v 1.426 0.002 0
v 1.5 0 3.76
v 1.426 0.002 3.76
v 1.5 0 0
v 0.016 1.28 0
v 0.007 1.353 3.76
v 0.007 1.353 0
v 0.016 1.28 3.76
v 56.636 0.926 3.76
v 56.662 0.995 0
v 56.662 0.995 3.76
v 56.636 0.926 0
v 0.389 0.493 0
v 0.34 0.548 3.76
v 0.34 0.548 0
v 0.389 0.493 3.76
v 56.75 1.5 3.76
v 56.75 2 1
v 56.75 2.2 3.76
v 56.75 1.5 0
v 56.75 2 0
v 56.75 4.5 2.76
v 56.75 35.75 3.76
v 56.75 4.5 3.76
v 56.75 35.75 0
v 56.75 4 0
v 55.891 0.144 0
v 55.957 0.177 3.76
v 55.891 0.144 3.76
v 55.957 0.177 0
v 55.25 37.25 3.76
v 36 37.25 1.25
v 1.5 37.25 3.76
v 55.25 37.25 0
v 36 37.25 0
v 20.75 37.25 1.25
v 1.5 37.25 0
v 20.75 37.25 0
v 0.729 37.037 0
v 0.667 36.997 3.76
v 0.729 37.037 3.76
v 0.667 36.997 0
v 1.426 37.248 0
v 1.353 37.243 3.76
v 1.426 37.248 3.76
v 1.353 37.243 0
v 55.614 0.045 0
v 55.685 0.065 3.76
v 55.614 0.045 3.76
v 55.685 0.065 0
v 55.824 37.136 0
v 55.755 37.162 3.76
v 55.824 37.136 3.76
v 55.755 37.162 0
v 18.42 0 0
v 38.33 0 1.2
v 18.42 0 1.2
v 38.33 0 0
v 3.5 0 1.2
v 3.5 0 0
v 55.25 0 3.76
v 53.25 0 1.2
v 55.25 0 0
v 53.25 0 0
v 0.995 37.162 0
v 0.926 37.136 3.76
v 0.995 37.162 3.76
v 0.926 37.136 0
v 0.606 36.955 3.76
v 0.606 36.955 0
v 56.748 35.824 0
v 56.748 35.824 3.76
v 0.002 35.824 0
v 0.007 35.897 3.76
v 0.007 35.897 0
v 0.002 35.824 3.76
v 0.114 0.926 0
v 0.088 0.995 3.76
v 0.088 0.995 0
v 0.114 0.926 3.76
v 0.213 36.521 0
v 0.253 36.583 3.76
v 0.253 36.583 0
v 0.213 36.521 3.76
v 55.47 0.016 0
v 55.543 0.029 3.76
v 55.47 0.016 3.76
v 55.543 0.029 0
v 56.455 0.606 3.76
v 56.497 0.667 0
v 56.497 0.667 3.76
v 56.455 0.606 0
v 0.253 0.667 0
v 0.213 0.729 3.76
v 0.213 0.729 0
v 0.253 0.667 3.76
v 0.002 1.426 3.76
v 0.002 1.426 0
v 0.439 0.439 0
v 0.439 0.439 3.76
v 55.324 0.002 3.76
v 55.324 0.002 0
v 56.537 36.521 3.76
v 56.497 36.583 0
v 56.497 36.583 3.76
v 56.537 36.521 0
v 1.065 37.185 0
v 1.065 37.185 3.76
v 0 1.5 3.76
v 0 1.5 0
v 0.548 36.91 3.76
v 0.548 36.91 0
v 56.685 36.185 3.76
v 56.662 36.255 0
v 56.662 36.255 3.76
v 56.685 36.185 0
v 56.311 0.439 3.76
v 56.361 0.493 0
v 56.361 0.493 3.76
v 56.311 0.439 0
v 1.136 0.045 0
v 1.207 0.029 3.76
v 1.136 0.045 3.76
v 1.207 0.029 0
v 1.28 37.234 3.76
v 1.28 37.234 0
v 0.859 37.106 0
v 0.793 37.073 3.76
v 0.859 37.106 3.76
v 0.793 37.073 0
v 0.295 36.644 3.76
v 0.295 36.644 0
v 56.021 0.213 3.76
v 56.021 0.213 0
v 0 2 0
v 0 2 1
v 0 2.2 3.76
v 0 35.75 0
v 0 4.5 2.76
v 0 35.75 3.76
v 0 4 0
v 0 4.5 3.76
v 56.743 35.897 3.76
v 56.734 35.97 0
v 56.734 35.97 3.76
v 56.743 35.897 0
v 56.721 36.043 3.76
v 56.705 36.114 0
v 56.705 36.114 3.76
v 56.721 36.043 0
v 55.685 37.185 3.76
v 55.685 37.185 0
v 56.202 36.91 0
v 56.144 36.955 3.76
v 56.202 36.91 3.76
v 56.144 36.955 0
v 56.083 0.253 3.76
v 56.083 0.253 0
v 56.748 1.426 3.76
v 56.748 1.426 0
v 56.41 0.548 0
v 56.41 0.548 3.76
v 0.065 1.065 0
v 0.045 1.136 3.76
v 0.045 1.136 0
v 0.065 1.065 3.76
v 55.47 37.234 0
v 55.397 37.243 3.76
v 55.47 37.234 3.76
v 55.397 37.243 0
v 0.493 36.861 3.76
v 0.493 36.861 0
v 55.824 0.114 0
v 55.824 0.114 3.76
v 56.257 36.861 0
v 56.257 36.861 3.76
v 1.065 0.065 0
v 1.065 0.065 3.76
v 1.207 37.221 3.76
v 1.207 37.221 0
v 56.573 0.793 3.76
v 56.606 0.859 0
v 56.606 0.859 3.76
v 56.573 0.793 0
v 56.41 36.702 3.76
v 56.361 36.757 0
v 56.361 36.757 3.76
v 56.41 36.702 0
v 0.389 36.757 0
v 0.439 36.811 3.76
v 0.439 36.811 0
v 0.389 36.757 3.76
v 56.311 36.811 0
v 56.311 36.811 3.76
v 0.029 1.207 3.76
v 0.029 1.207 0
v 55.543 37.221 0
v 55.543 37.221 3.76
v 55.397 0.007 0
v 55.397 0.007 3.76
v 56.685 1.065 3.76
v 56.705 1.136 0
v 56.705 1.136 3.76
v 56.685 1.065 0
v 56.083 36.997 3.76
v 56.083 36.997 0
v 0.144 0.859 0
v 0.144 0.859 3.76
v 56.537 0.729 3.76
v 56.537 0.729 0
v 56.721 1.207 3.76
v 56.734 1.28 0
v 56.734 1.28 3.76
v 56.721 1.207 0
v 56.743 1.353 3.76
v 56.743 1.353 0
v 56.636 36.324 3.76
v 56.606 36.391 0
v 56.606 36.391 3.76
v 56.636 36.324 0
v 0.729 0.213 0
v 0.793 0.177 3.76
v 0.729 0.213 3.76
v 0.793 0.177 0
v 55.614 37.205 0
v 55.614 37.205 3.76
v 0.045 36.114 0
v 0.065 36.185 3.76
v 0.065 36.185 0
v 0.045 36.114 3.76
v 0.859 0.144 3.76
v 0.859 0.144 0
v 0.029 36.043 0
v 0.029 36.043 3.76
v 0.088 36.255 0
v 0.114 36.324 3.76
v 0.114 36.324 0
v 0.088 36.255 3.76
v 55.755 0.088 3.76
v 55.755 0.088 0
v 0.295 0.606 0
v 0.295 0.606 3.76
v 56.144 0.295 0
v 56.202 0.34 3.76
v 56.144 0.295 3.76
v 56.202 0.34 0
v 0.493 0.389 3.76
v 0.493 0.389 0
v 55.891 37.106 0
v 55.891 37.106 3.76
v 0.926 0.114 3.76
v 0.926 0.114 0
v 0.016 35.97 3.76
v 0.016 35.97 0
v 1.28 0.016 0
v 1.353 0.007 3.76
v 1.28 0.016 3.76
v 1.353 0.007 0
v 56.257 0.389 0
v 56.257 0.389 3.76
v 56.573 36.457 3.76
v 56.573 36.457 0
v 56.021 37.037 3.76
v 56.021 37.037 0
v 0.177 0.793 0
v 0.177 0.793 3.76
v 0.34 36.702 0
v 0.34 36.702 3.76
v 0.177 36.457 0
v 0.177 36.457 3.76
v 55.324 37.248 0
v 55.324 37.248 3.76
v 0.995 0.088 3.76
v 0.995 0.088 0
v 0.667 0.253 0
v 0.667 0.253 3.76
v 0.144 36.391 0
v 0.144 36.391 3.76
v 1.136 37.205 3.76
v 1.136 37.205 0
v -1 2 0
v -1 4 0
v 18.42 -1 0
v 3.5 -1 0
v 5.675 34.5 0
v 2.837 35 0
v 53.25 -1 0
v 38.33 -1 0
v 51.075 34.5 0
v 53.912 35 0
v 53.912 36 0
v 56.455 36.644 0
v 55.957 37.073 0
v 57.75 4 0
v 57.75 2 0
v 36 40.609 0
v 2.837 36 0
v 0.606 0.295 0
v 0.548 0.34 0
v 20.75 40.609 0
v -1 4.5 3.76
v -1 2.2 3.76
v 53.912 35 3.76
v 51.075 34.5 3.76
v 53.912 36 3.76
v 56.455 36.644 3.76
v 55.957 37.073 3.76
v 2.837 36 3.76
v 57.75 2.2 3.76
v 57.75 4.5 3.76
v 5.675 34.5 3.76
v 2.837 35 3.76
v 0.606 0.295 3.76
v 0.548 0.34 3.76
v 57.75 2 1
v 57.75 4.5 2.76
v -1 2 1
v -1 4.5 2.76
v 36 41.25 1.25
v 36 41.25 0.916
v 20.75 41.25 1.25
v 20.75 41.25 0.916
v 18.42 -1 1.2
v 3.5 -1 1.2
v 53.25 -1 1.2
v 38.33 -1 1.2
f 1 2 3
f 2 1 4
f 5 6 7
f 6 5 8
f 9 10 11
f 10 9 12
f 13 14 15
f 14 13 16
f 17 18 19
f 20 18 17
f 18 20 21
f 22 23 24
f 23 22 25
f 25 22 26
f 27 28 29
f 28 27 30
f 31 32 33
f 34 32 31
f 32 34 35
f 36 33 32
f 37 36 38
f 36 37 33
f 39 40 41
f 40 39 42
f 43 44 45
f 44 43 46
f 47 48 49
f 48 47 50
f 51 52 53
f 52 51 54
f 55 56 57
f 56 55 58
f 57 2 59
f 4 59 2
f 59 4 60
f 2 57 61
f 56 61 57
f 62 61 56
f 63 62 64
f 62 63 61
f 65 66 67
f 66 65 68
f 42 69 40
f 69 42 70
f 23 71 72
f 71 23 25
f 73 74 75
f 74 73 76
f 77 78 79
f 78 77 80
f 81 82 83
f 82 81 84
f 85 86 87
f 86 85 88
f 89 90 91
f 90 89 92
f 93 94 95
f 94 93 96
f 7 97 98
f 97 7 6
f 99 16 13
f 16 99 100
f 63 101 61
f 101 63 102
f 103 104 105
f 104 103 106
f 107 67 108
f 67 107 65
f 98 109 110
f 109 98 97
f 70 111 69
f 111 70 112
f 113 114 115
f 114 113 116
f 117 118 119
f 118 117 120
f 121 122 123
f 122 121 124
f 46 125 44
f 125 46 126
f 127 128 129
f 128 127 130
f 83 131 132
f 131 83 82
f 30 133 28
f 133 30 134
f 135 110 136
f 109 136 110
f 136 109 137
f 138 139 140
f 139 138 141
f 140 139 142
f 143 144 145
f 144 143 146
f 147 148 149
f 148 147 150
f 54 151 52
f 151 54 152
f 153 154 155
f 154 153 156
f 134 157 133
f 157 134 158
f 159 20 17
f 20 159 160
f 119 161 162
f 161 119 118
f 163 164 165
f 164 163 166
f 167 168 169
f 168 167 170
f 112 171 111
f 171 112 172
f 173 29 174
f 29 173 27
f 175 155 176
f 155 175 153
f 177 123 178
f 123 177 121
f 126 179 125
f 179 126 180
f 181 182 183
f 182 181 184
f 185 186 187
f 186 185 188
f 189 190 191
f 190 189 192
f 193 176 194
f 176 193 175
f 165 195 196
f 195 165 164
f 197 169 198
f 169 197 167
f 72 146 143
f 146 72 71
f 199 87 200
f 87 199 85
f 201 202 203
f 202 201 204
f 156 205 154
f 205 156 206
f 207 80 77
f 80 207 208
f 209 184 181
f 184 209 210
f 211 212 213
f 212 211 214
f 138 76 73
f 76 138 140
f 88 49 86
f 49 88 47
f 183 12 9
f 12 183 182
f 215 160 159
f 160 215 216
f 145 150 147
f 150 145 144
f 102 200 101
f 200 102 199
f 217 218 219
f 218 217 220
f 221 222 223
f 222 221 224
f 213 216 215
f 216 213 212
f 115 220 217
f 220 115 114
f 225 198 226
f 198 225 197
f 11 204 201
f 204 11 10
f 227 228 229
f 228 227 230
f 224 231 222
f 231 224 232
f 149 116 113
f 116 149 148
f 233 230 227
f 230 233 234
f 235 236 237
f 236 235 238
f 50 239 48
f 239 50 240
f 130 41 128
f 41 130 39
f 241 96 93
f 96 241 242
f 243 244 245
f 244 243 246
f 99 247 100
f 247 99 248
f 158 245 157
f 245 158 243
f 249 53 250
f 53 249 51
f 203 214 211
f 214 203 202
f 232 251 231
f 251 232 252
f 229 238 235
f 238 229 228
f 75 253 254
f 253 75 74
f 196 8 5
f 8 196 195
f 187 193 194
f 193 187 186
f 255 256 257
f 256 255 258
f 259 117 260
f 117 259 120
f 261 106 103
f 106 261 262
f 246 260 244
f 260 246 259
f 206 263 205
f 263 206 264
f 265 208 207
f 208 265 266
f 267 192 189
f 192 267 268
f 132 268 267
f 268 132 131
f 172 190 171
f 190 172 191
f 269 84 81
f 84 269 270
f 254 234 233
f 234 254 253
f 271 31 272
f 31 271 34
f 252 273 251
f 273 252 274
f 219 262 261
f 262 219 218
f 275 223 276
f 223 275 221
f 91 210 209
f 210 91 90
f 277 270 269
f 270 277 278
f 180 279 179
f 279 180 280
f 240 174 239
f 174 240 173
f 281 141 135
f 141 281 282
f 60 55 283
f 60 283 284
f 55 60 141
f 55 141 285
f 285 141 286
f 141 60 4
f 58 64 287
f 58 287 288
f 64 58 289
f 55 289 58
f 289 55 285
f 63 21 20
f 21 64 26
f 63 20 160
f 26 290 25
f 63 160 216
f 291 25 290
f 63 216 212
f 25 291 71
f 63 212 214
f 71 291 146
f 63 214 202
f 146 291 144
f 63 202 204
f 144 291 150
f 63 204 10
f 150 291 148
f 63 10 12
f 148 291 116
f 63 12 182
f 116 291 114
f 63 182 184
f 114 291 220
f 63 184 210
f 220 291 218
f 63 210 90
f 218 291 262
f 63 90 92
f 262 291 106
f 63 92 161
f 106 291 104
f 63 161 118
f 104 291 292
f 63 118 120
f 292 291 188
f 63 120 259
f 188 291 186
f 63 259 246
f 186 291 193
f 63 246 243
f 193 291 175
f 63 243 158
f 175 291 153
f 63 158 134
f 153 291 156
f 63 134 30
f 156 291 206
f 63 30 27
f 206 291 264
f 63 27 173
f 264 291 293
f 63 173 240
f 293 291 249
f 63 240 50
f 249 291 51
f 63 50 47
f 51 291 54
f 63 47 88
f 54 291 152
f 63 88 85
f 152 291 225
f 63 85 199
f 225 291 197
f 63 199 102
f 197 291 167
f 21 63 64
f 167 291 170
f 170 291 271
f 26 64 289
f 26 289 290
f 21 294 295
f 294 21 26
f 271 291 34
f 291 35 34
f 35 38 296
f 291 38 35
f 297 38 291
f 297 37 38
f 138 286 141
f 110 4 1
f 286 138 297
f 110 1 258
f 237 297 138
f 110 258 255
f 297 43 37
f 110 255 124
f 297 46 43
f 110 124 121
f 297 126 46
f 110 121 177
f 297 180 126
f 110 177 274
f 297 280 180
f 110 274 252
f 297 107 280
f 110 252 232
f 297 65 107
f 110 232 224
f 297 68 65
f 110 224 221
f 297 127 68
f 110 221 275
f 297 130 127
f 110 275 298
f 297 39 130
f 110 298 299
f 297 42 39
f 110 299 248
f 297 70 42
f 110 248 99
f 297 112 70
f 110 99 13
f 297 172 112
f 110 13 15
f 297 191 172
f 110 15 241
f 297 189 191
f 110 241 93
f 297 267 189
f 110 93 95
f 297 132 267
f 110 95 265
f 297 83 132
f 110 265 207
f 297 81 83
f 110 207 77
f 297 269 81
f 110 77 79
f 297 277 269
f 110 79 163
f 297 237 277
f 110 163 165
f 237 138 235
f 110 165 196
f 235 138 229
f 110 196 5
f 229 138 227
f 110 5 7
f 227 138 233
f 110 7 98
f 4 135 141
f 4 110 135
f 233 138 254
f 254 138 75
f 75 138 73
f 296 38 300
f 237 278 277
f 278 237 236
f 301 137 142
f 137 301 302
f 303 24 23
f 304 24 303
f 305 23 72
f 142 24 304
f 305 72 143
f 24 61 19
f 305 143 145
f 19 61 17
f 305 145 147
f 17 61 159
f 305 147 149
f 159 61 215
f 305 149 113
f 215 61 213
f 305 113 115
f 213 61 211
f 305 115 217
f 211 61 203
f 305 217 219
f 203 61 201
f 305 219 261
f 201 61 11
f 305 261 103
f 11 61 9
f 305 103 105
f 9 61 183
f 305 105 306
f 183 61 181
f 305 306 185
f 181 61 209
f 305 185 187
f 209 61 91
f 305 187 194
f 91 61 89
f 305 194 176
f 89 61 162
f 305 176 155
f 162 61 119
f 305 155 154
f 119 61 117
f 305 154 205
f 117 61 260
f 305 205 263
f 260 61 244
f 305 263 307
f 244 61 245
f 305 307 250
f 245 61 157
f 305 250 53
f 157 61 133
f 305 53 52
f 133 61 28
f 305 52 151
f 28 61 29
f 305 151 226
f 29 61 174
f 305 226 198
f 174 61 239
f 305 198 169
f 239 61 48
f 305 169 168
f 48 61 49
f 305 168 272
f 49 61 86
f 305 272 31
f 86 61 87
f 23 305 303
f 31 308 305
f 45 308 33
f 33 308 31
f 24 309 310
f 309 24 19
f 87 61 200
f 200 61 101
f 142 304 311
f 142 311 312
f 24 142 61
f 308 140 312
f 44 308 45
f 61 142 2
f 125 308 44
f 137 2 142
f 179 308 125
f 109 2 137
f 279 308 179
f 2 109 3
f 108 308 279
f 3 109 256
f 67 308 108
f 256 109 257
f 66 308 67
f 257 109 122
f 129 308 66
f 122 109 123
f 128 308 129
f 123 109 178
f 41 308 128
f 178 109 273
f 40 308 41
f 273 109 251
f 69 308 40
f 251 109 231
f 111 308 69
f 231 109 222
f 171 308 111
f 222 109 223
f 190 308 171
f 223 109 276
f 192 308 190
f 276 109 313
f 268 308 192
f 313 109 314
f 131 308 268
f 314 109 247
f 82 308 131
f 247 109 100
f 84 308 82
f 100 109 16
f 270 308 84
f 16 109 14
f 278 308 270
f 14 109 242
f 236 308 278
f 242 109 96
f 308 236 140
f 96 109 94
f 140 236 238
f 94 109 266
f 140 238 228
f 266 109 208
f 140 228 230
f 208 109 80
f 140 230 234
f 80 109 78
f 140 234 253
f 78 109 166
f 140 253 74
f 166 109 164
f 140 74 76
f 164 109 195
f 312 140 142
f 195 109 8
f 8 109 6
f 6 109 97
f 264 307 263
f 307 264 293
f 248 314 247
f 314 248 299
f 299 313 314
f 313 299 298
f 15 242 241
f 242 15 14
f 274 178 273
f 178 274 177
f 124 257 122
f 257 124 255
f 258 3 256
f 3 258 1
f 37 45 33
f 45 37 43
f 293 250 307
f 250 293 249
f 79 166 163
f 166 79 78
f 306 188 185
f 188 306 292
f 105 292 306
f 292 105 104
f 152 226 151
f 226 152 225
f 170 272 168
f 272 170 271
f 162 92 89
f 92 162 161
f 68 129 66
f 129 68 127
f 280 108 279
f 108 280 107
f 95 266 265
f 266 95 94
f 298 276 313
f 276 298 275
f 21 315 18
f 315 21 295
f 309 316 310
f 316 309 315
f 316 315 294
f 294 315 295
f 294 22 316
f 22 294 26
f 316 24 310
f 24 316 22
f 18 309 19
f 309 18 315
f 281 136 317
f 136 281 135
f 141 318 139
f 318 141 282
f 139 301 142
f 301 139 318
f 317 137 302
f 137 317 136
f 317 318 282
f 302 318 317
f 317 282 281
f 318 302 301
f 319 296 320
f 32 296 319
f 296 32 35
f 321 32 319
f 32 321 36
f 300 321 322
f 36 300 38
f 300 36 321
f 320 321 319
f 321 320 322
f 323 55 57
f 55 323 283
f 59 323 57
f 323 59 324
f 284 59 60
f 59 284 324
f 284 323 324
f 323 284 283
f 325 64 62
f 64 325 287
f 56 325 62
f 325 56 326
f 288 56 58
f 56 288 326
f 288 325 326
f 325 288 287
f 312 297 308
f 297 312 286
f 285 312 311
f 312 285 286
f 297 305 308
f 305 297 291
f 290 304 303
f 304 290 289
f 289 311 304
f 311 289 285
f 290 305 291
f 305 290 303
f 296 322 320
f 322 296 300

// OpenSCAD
module plug() {
    $fn=128;
    H=4-0.24;
    
    union() {
    // Main body
    hull() {
        translate([1,1,0]*3/2)
        cylinder(h=H, d=3);
        
        translate([56.75-3,0,0])
        translate([1,1,0]*3/2)
        cylinder(h=H, d=3);
        
        translate([56.75-3,37.25-3,0])
        translate([1,1,0]*3/2)
        cylinder(h=H, d=3);
        
        translate([0,37.25-3,0])
        translate([1,1,0]*3/2)
        cylinder(h=H, d=3);
    }

    // Side pegs
    translate([56.75,2,0])
    hull() {
        cube([1,2,1]);
        
        translate([0,.2,3-.24])
        cube([1,2.5-.2,1]);
    }
    
    translate([-1,2,0])
    hull() {
        cube([1,2,1]);
        
        translate([0,.2,3-.24])
        cube([1,2.5-.2,1]);
    }
    
    // Top peg
    translate([56.75/2,37.25+2,1.25/2])
    cube([15.25,4,1.25], center=true);


    // Bottom tabs
    translate([3.5,-1,0])
    cube([14.92,1,1.2]);
    
    translate([56.75-3.5-14.92,-1,0])
    cube([14.92,1,1.2]);
    }
}

module fullPlug(){
    
    difference() {
        plug();

        hull() {
        
        translate([56.75*.5, 35.5,2])
        cube([56.75*0.9,1,6],center=true);
        
        translate([56.75*.5, 35,2])
        cube([56.75*0.8,1,6],center=true);
        
        }

        translate([(56.75-20)*.5,42,-1.5])
        rotate([55,0,0])
        cube([20,20,2]);
    }
}

fullPlug();
